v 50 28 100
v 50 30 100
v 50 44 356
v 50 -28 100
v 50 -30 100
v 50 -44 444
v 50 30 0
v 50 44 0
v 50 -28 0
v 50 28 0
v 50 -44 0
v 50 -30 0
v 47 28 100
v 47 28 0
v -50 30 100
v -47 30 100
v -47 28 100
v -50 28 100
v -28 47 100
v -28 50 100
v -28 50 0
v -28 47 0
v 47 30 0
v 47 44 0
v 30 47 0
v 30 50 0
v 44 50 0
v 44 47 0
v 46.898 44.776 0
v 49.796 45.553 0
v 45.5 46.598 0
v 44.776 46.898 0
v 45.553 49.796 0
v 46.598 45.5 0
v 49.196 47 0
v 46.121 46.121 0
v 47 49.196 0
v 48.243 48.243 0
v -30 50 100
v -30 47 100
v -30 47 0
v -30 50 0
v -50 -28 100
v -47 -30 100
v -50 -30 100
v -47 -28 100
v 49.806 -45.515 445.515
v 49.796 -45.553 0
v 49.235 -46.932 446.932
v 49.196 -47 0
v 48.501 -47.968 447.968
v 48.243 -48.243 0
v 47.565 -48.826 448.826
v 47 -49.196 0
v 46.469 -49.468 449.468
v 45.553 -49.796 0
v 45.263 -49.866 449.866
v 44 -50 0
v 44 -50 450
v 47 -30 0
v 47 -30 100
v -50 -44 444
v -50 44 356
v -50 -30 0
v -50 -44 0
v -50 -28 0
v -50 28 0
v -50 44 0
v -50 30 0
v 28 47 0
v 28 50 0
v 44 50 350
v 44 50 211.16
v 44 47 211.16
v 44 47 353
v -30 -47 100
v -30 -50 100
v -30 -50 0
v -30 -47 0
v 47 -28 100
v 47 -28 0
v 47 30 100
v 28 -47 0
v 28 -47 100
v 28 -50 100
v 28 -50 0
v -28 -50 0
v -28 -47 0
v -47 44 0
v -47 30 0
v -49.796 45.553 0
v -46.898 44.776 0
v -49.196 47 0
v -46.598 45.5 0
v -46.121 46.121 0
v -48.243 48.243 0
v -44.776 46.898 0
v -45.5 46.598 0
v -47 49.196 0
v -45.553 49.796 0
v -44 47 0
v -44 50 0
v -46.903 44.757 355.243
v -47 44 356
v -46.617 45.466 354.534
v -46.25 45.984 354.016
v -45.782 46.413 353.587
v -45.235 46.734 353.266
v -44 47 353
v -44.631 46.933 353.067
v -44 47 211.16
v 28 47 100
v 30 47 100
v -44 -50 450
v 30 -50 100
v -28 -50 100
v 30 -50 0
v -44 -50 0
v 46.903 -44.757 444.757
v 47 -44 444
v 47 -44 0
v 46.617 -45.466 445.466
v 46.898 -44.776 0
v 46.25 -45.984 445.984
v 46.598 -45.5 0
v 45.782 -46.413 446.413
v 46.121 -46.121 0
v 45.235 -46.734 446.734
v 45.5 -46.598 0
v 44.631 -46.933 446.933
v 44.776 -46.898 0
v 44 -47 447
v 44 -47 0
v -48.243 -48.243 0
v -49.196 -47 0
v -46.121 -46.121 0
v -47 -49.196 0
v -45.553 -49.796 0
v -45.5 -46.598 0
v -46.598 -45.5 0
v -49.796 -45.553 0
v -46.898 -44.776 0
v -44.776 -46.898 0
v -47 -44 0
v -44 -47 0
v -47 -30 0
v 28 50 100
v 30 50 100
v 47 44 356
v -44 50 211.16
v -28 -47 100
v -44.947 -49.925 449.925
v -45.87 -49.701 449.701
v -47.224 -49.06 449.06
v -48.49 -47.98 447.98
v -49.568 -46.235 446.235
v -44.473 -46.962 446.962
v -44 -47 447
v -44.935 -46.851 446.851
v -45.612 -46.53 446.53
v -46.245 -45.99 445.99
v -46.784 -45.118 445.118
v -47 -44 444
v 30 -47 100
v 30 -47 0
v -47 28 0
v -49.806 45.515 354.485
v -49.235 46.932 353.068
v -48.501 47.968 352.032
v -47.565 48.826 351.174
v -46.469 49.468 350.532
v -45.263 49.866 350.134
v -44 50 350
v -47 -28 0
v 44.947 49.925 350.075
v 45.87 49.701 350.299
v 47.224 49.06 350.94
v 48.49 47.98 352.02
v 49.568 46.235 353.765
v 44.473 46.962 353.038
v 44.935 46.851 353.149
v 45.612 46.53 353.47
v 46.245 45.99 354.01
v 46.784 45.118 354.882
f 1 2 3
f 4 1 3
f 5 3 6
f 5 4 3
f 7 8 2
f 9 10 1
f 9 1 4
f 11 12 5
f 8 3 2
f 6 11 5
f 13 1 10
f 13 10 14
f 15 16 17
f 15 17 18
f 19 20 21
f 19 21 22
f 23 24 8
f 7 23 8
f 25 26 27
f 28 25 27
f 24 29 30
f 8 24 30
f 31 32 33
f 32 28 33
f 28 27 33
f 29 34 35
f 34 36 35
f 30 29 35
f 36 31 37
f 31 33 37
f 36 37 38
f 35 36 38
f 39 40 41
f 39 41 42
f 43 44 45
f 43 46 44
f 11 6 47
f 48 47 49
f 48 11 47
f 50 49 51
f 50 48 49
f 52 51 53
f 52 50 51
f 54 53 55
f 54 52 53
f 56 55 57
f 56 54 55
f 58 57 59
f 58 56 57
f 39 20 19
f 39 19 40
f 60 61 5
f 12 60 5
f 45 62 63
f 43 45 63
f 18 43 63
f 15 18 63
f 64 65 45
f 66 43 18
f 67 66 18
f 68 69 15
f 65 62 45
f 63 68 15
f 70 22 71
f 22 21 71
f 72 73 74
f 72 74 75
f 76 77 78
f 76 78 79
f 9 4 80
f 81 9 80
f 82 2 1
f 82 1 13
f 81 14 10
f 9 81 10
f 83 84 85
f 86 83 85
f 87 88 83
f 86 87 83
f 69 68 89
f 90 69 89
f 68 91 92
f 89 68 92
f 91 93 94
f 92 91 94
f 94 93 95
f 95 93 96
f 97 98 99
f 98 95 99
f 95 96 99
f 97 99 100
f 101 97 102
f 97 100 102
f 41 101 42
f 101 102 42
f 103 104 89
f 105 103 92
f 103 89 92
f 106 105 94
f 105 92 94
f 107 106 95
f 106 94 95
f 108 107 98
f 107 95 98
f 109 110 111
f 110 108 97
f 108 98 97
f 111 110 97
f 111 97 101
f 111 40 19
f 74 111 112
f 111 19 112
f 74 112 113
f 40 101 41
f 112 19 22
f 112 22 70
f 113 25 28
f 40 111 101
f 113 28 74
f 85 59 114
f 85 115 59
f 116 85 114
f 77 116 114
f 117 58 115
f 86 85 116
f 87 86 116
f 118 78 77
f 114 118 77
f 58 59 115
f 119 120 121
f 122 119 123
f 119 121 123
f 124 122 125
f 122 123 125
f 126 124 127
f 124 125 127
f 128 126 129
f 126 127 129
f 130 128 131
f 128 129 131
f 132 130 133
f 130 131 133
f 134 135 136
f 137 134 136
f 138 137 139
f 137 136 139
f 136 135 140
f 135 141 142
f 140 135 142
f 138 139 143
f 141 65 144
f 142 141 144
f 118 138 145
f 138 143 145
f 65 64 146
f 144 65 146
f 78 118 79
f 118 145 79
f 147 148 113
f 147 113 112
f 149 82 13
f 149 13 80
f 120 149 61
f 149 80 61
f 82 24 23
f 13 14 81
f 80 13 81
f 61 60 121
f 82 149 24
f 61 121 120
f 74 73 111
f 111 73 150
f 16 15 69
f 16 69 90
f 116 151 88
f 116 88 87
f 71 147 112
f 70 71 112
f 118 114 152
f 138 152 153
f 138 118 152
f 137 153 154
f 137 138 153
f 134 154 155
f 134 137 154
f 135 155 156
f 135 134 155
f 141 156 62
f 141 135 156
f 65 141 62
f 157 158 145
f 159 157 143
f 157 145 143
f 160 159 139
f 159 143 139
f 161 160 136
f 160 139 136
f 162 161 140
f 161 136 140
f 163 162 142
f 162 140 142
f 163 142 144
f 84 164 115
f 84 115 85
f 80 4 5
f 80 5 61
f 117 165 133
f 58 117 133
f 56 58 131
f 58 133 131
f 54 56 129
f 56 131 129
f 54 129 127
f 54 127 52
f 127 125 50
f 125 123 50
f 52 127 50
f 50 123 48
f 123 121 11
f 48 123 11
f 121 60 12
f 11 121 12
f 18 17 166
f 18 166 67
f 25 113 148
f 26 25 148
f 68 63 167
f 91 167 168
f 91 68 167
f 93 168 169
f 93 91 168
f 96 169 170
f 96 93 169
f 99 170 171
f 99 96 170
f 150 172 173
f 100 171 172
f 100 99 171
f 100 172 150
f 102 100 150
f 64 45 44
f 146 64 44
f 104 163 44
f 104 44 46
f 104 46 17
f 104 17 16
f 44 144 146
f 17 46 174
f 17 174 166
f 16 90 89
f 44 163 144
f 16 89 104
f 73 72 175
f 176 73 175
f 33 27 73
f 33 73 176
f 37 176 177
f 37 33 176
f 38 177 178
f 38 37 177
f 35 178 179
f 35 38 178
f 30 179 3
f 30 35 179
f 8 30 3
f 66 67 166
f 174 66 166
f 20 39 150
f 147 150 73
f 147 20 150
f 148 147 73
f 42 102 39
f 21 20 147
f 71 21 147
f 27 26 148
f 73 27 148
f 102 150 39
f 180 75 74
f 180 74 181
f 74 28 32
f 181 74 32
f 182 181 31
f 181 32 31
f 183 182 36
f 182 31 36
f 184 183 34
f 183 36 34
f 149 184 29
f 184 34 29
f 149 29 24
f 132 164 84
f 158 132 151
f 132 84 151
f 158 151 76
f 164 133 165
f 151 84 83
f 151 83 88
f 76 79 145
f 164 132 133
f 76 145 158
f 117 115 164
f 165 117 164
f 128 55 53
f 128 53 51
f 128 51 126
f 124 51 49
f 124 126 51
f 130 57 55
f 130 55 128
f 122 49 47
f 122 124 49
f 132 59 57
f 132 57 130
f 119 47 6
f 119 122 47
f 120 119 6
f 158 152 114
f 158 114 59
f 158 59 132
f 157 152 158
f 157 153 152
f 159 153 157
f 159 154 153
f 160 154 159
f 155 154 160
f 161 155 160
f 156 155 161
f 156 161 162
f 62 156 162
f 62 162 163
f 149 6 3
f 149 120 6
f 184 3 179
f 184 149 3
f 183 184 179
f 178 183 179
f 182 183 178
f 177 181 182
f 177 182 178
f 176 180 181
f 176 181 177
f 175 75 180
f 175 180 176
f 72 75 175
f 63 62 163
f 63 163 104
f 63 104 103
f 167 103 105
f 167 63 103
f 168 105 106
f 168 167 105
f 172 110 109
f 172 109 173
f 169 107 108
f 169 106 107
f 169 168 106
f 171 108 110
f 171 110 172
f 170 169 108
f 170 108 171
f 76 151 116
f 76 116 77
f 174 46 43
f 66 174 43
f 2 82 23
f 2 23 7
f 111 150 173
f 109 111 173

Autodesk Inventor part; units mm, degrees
ref_plane "Start Plane" through (0, 0, 0) normal (0, 0, 1) x (1, 0, 0)
ref_plane "End Plane" through (0, 0, 450) normal (0, 0, 1) x (1, 0, 0)
sketch "Sketch" plane through (0, 0, 0) normal (0, 0, 1) x (1, 0, 0)
  line L0 (-50, -44) -> (-50, 44)
  line L1 (-44, 50) -> (44, 50)
  line L2 (50, 44) -> (50, -44)
  line L3 (44, -50) -> (-44, -50)
  arc A0 (-50, -44) -> (-44, -50) centre (-44, -44) ccw
  arc A1 (50, 44) -> (44, 50) centre (44, 44) ccw
  arc A2 (-44, 50) -> (-50, 44) centre (-44, 44) ccw
  arc A3 (44, -50) -> (50, -44) centre (44, -44) ccw
  arc A4 (-44, 47) -> (-47, 44) centre (-44, 44) ccw
  line L4 (-44, 47) -> (44, 47)
  arc A5 (47, 44) -> (44, 47) centre (44, 44) ccw
  line L5 (47, 44) -> (47, -44)
  arc A6 (44, -47) -> (47, -44) centre (44, -44) ccw
  line L6 (44, -47) -> (-44, -47)
  arc A7 (-47, -44) -> (-44, -47) centre (-44, -44) ccw
  line L7 (-47, -44) -> (-47, 44)
  line L8 (0, 71.7397) -> (0, -71.7397) construction
  line L9 (-71.7397, 0) -> (71.7397, 0) construction
  dimension "d7" = 6
  dimension "d9" = 100
  dimension "d11" = 100
  dimension "d12" = 3
  dimension "d15" = 50
  dimension "d16" = 50
extrude "Body" add sketch "Sketch" along normal up to surface (450 mm away) from surface at 0
sketch "Sketch3" plane through (0, 0, 0) normal (0, 0, 1) x (1, 0, 0)
  line L0 (0, 0) -> (10, 0)
ref_plane "Work Plane3" through (0, 0, 0) normal (0, -1, 0) x (1, 0, 0)
sketch "Sketch5" plane through (44, 50, 450) normal (0, 1, 0) x (1, 0, 0)
  line L0 (-88, 0) -> (0, 0) projected
  line L1 (0, 450) -> (0, 0) projected
  line L2 (-88, 0) -> (0, 0)
  line L3 (0, 0) -> (0, 141.42)
  line L4 (0, 141.42) -> (-88, 141.42)
  line L5 (-88, 141.42) -> (-88, 0)
  point P0 (-44, 450)
  point P1 (-44, 0)
  point P2 (-44, 141.42)
  dimension "d19" = 141.42
extrude "Extrusion2" cut sketch "Sketch5" against normal blind 10
sketch "Sketch6" plane through (0, 0, 0) normal (0, 0, -1) x (-1, 0, 0)
  line L0 (44, 50) -> (-44, 50) projected
  line L1 (-44, -50) -> (44, -50) projected
  line L2 (30, 50) -> (28, 50)
  line L3 (28, 50) -> (28, -50)
  line L4 (28, -50) -> (30, -50)
  line L5 (30, -50) -> (30, 50)
  line L6 (50, -44) -> (50, 44) projected
  line L7 (50, -30) -> (-50.0252, -30)
  line L8 (-50.0252, -30) -> (-50.0252, -28)
  line L9 (-50.0252, -28) -> (50, -28)
  line L10 (50, -28) -> (50, -30)
  line L11 (-28, -50) -> (-30, -50)
  line L12 (-30, -50) -> (-30, 50)
  line L13 (-30, 50) -> (-28, 50)
  line L14 (-28, 50) -> (-28, -50)
  line L15 (-50, 44) -> (-50, -44) projected
  line L16 (50, 30) -> (-50, 30)
  line L17 (-50, 30) -> (-50, 28)
  line L18 (-50, 28) -> (50, 28)
  line L19 (50, 28) -> (50, 30)
  point P0 (0, 0)
  point P1 (30, -30)
  point P2 (30, -28)
  point P3 (30, 28)
  point P4 (30, 30)
  point P5 (28, 30)
  point P6 (-28, 30)
  point P7 (-30, 30)
  point P8 (-50, 30)
  point P9 (-30, 28)
  point P10 (-30, -28)
  point P11 (-30, -30)
  point P12 (-28, -30)
  point P13 (28, -30)
  point P14 (28, -28)
  point P15 (-28, -28)
  point P16 (-28, 28)
  point P17 (28, 28)
  dimension "d22" = 2
  dimension "d23" = 2
  dimension "d24" = 20
  dimension "d25" = 20
  dimension "d26" = 2
  dimension "d27" = 2
  dimension "d28" = 20
  dimension "d29" = 20
extrude "Extrusion3" cut sketch "Sketch6" against normal blind 100 contours L5 L16 L3 L0 | L16 L6 L18 L5 | L5 L18 L3 L16 | L14 L16 L12 L0 | L3 L18 L14 L16 | L5 L9 L3 L18 | L14 L18 L12 L16 | L9 L6 L7 L5 | L5 L7 L3 L9 | L12 L18 L15 L16 | L14 L9 L12 L18 | L3 L7 L14 L9 | L5 L1 L3 L7 | L14 L7 L12 L9 | L12 L7 L15 L9 | L14 L1 L12 L7 | L15 L7 L8 L9
ref_plane "Work Plane5" through (0, -50, 450) normal (0, 0.7071, 0.7071) x (1, 0, 0)
split "Split2" plane through (0, -50, 450) removes the side toward (0, 0.7071, 0.7071)
sketch "Sketch7" plane through (-44, 50, 308.58) normal (0, 1, 0) x (1, 0, 0)
  line L0 (0, 0) -> (0, -44.42) projected
  line L1 (88, 308.58) -> (88, -138.42) projected
  line L2 (0, 0) -> (88, 0)
  line L3 (88, 0) -> (88, 97.42)
  line L4 (88, 97.42) -> (0, 97.42)
  line L5 (0, 97.42) -> (0, 0)
  point P0 (44, 308.58)
  point P1 (88, 0)
  dimension "d32" = 97.42
extrude "Extrusion4" cut sketch "Sketch7" against normal blind 5
sketch "Sketch4" plane through (0, 0, 0) normal (0, -1, 0) x (1, 0, 0)
  line L0 (-2, 0) -> (12, 0) projected
  line L1 (-2, 450) -> (12, 450) projected
  dimension "d18" = 450
equation "\"d7\" = G_IR"
equation "\"d9\" = G_W"
equation "\"d11\" = G_H"
equation "\"d12\" = G_T"
equation "\"d15\" = 0.5 * d9"
equation "\"d16\" = 0.5 * d11"
equation "\"d3\" = G_L"
equation "\"d23\" = d22"
equation "\"d26\" = d22"
equation "\"d27\" = d22"
equation "\"G_W\" = 100"
equation "\"G_H\" = 100"
equation "\"G_T\" = 3"
equation "\"G_IR\" = 6"
equation "\"G_L\" = d18"
equation "\"G_OFFSET_START\" = 0"
properties part number "ISO 10799-2 - 100x100x3 - 450" material "Steel, Mild"
